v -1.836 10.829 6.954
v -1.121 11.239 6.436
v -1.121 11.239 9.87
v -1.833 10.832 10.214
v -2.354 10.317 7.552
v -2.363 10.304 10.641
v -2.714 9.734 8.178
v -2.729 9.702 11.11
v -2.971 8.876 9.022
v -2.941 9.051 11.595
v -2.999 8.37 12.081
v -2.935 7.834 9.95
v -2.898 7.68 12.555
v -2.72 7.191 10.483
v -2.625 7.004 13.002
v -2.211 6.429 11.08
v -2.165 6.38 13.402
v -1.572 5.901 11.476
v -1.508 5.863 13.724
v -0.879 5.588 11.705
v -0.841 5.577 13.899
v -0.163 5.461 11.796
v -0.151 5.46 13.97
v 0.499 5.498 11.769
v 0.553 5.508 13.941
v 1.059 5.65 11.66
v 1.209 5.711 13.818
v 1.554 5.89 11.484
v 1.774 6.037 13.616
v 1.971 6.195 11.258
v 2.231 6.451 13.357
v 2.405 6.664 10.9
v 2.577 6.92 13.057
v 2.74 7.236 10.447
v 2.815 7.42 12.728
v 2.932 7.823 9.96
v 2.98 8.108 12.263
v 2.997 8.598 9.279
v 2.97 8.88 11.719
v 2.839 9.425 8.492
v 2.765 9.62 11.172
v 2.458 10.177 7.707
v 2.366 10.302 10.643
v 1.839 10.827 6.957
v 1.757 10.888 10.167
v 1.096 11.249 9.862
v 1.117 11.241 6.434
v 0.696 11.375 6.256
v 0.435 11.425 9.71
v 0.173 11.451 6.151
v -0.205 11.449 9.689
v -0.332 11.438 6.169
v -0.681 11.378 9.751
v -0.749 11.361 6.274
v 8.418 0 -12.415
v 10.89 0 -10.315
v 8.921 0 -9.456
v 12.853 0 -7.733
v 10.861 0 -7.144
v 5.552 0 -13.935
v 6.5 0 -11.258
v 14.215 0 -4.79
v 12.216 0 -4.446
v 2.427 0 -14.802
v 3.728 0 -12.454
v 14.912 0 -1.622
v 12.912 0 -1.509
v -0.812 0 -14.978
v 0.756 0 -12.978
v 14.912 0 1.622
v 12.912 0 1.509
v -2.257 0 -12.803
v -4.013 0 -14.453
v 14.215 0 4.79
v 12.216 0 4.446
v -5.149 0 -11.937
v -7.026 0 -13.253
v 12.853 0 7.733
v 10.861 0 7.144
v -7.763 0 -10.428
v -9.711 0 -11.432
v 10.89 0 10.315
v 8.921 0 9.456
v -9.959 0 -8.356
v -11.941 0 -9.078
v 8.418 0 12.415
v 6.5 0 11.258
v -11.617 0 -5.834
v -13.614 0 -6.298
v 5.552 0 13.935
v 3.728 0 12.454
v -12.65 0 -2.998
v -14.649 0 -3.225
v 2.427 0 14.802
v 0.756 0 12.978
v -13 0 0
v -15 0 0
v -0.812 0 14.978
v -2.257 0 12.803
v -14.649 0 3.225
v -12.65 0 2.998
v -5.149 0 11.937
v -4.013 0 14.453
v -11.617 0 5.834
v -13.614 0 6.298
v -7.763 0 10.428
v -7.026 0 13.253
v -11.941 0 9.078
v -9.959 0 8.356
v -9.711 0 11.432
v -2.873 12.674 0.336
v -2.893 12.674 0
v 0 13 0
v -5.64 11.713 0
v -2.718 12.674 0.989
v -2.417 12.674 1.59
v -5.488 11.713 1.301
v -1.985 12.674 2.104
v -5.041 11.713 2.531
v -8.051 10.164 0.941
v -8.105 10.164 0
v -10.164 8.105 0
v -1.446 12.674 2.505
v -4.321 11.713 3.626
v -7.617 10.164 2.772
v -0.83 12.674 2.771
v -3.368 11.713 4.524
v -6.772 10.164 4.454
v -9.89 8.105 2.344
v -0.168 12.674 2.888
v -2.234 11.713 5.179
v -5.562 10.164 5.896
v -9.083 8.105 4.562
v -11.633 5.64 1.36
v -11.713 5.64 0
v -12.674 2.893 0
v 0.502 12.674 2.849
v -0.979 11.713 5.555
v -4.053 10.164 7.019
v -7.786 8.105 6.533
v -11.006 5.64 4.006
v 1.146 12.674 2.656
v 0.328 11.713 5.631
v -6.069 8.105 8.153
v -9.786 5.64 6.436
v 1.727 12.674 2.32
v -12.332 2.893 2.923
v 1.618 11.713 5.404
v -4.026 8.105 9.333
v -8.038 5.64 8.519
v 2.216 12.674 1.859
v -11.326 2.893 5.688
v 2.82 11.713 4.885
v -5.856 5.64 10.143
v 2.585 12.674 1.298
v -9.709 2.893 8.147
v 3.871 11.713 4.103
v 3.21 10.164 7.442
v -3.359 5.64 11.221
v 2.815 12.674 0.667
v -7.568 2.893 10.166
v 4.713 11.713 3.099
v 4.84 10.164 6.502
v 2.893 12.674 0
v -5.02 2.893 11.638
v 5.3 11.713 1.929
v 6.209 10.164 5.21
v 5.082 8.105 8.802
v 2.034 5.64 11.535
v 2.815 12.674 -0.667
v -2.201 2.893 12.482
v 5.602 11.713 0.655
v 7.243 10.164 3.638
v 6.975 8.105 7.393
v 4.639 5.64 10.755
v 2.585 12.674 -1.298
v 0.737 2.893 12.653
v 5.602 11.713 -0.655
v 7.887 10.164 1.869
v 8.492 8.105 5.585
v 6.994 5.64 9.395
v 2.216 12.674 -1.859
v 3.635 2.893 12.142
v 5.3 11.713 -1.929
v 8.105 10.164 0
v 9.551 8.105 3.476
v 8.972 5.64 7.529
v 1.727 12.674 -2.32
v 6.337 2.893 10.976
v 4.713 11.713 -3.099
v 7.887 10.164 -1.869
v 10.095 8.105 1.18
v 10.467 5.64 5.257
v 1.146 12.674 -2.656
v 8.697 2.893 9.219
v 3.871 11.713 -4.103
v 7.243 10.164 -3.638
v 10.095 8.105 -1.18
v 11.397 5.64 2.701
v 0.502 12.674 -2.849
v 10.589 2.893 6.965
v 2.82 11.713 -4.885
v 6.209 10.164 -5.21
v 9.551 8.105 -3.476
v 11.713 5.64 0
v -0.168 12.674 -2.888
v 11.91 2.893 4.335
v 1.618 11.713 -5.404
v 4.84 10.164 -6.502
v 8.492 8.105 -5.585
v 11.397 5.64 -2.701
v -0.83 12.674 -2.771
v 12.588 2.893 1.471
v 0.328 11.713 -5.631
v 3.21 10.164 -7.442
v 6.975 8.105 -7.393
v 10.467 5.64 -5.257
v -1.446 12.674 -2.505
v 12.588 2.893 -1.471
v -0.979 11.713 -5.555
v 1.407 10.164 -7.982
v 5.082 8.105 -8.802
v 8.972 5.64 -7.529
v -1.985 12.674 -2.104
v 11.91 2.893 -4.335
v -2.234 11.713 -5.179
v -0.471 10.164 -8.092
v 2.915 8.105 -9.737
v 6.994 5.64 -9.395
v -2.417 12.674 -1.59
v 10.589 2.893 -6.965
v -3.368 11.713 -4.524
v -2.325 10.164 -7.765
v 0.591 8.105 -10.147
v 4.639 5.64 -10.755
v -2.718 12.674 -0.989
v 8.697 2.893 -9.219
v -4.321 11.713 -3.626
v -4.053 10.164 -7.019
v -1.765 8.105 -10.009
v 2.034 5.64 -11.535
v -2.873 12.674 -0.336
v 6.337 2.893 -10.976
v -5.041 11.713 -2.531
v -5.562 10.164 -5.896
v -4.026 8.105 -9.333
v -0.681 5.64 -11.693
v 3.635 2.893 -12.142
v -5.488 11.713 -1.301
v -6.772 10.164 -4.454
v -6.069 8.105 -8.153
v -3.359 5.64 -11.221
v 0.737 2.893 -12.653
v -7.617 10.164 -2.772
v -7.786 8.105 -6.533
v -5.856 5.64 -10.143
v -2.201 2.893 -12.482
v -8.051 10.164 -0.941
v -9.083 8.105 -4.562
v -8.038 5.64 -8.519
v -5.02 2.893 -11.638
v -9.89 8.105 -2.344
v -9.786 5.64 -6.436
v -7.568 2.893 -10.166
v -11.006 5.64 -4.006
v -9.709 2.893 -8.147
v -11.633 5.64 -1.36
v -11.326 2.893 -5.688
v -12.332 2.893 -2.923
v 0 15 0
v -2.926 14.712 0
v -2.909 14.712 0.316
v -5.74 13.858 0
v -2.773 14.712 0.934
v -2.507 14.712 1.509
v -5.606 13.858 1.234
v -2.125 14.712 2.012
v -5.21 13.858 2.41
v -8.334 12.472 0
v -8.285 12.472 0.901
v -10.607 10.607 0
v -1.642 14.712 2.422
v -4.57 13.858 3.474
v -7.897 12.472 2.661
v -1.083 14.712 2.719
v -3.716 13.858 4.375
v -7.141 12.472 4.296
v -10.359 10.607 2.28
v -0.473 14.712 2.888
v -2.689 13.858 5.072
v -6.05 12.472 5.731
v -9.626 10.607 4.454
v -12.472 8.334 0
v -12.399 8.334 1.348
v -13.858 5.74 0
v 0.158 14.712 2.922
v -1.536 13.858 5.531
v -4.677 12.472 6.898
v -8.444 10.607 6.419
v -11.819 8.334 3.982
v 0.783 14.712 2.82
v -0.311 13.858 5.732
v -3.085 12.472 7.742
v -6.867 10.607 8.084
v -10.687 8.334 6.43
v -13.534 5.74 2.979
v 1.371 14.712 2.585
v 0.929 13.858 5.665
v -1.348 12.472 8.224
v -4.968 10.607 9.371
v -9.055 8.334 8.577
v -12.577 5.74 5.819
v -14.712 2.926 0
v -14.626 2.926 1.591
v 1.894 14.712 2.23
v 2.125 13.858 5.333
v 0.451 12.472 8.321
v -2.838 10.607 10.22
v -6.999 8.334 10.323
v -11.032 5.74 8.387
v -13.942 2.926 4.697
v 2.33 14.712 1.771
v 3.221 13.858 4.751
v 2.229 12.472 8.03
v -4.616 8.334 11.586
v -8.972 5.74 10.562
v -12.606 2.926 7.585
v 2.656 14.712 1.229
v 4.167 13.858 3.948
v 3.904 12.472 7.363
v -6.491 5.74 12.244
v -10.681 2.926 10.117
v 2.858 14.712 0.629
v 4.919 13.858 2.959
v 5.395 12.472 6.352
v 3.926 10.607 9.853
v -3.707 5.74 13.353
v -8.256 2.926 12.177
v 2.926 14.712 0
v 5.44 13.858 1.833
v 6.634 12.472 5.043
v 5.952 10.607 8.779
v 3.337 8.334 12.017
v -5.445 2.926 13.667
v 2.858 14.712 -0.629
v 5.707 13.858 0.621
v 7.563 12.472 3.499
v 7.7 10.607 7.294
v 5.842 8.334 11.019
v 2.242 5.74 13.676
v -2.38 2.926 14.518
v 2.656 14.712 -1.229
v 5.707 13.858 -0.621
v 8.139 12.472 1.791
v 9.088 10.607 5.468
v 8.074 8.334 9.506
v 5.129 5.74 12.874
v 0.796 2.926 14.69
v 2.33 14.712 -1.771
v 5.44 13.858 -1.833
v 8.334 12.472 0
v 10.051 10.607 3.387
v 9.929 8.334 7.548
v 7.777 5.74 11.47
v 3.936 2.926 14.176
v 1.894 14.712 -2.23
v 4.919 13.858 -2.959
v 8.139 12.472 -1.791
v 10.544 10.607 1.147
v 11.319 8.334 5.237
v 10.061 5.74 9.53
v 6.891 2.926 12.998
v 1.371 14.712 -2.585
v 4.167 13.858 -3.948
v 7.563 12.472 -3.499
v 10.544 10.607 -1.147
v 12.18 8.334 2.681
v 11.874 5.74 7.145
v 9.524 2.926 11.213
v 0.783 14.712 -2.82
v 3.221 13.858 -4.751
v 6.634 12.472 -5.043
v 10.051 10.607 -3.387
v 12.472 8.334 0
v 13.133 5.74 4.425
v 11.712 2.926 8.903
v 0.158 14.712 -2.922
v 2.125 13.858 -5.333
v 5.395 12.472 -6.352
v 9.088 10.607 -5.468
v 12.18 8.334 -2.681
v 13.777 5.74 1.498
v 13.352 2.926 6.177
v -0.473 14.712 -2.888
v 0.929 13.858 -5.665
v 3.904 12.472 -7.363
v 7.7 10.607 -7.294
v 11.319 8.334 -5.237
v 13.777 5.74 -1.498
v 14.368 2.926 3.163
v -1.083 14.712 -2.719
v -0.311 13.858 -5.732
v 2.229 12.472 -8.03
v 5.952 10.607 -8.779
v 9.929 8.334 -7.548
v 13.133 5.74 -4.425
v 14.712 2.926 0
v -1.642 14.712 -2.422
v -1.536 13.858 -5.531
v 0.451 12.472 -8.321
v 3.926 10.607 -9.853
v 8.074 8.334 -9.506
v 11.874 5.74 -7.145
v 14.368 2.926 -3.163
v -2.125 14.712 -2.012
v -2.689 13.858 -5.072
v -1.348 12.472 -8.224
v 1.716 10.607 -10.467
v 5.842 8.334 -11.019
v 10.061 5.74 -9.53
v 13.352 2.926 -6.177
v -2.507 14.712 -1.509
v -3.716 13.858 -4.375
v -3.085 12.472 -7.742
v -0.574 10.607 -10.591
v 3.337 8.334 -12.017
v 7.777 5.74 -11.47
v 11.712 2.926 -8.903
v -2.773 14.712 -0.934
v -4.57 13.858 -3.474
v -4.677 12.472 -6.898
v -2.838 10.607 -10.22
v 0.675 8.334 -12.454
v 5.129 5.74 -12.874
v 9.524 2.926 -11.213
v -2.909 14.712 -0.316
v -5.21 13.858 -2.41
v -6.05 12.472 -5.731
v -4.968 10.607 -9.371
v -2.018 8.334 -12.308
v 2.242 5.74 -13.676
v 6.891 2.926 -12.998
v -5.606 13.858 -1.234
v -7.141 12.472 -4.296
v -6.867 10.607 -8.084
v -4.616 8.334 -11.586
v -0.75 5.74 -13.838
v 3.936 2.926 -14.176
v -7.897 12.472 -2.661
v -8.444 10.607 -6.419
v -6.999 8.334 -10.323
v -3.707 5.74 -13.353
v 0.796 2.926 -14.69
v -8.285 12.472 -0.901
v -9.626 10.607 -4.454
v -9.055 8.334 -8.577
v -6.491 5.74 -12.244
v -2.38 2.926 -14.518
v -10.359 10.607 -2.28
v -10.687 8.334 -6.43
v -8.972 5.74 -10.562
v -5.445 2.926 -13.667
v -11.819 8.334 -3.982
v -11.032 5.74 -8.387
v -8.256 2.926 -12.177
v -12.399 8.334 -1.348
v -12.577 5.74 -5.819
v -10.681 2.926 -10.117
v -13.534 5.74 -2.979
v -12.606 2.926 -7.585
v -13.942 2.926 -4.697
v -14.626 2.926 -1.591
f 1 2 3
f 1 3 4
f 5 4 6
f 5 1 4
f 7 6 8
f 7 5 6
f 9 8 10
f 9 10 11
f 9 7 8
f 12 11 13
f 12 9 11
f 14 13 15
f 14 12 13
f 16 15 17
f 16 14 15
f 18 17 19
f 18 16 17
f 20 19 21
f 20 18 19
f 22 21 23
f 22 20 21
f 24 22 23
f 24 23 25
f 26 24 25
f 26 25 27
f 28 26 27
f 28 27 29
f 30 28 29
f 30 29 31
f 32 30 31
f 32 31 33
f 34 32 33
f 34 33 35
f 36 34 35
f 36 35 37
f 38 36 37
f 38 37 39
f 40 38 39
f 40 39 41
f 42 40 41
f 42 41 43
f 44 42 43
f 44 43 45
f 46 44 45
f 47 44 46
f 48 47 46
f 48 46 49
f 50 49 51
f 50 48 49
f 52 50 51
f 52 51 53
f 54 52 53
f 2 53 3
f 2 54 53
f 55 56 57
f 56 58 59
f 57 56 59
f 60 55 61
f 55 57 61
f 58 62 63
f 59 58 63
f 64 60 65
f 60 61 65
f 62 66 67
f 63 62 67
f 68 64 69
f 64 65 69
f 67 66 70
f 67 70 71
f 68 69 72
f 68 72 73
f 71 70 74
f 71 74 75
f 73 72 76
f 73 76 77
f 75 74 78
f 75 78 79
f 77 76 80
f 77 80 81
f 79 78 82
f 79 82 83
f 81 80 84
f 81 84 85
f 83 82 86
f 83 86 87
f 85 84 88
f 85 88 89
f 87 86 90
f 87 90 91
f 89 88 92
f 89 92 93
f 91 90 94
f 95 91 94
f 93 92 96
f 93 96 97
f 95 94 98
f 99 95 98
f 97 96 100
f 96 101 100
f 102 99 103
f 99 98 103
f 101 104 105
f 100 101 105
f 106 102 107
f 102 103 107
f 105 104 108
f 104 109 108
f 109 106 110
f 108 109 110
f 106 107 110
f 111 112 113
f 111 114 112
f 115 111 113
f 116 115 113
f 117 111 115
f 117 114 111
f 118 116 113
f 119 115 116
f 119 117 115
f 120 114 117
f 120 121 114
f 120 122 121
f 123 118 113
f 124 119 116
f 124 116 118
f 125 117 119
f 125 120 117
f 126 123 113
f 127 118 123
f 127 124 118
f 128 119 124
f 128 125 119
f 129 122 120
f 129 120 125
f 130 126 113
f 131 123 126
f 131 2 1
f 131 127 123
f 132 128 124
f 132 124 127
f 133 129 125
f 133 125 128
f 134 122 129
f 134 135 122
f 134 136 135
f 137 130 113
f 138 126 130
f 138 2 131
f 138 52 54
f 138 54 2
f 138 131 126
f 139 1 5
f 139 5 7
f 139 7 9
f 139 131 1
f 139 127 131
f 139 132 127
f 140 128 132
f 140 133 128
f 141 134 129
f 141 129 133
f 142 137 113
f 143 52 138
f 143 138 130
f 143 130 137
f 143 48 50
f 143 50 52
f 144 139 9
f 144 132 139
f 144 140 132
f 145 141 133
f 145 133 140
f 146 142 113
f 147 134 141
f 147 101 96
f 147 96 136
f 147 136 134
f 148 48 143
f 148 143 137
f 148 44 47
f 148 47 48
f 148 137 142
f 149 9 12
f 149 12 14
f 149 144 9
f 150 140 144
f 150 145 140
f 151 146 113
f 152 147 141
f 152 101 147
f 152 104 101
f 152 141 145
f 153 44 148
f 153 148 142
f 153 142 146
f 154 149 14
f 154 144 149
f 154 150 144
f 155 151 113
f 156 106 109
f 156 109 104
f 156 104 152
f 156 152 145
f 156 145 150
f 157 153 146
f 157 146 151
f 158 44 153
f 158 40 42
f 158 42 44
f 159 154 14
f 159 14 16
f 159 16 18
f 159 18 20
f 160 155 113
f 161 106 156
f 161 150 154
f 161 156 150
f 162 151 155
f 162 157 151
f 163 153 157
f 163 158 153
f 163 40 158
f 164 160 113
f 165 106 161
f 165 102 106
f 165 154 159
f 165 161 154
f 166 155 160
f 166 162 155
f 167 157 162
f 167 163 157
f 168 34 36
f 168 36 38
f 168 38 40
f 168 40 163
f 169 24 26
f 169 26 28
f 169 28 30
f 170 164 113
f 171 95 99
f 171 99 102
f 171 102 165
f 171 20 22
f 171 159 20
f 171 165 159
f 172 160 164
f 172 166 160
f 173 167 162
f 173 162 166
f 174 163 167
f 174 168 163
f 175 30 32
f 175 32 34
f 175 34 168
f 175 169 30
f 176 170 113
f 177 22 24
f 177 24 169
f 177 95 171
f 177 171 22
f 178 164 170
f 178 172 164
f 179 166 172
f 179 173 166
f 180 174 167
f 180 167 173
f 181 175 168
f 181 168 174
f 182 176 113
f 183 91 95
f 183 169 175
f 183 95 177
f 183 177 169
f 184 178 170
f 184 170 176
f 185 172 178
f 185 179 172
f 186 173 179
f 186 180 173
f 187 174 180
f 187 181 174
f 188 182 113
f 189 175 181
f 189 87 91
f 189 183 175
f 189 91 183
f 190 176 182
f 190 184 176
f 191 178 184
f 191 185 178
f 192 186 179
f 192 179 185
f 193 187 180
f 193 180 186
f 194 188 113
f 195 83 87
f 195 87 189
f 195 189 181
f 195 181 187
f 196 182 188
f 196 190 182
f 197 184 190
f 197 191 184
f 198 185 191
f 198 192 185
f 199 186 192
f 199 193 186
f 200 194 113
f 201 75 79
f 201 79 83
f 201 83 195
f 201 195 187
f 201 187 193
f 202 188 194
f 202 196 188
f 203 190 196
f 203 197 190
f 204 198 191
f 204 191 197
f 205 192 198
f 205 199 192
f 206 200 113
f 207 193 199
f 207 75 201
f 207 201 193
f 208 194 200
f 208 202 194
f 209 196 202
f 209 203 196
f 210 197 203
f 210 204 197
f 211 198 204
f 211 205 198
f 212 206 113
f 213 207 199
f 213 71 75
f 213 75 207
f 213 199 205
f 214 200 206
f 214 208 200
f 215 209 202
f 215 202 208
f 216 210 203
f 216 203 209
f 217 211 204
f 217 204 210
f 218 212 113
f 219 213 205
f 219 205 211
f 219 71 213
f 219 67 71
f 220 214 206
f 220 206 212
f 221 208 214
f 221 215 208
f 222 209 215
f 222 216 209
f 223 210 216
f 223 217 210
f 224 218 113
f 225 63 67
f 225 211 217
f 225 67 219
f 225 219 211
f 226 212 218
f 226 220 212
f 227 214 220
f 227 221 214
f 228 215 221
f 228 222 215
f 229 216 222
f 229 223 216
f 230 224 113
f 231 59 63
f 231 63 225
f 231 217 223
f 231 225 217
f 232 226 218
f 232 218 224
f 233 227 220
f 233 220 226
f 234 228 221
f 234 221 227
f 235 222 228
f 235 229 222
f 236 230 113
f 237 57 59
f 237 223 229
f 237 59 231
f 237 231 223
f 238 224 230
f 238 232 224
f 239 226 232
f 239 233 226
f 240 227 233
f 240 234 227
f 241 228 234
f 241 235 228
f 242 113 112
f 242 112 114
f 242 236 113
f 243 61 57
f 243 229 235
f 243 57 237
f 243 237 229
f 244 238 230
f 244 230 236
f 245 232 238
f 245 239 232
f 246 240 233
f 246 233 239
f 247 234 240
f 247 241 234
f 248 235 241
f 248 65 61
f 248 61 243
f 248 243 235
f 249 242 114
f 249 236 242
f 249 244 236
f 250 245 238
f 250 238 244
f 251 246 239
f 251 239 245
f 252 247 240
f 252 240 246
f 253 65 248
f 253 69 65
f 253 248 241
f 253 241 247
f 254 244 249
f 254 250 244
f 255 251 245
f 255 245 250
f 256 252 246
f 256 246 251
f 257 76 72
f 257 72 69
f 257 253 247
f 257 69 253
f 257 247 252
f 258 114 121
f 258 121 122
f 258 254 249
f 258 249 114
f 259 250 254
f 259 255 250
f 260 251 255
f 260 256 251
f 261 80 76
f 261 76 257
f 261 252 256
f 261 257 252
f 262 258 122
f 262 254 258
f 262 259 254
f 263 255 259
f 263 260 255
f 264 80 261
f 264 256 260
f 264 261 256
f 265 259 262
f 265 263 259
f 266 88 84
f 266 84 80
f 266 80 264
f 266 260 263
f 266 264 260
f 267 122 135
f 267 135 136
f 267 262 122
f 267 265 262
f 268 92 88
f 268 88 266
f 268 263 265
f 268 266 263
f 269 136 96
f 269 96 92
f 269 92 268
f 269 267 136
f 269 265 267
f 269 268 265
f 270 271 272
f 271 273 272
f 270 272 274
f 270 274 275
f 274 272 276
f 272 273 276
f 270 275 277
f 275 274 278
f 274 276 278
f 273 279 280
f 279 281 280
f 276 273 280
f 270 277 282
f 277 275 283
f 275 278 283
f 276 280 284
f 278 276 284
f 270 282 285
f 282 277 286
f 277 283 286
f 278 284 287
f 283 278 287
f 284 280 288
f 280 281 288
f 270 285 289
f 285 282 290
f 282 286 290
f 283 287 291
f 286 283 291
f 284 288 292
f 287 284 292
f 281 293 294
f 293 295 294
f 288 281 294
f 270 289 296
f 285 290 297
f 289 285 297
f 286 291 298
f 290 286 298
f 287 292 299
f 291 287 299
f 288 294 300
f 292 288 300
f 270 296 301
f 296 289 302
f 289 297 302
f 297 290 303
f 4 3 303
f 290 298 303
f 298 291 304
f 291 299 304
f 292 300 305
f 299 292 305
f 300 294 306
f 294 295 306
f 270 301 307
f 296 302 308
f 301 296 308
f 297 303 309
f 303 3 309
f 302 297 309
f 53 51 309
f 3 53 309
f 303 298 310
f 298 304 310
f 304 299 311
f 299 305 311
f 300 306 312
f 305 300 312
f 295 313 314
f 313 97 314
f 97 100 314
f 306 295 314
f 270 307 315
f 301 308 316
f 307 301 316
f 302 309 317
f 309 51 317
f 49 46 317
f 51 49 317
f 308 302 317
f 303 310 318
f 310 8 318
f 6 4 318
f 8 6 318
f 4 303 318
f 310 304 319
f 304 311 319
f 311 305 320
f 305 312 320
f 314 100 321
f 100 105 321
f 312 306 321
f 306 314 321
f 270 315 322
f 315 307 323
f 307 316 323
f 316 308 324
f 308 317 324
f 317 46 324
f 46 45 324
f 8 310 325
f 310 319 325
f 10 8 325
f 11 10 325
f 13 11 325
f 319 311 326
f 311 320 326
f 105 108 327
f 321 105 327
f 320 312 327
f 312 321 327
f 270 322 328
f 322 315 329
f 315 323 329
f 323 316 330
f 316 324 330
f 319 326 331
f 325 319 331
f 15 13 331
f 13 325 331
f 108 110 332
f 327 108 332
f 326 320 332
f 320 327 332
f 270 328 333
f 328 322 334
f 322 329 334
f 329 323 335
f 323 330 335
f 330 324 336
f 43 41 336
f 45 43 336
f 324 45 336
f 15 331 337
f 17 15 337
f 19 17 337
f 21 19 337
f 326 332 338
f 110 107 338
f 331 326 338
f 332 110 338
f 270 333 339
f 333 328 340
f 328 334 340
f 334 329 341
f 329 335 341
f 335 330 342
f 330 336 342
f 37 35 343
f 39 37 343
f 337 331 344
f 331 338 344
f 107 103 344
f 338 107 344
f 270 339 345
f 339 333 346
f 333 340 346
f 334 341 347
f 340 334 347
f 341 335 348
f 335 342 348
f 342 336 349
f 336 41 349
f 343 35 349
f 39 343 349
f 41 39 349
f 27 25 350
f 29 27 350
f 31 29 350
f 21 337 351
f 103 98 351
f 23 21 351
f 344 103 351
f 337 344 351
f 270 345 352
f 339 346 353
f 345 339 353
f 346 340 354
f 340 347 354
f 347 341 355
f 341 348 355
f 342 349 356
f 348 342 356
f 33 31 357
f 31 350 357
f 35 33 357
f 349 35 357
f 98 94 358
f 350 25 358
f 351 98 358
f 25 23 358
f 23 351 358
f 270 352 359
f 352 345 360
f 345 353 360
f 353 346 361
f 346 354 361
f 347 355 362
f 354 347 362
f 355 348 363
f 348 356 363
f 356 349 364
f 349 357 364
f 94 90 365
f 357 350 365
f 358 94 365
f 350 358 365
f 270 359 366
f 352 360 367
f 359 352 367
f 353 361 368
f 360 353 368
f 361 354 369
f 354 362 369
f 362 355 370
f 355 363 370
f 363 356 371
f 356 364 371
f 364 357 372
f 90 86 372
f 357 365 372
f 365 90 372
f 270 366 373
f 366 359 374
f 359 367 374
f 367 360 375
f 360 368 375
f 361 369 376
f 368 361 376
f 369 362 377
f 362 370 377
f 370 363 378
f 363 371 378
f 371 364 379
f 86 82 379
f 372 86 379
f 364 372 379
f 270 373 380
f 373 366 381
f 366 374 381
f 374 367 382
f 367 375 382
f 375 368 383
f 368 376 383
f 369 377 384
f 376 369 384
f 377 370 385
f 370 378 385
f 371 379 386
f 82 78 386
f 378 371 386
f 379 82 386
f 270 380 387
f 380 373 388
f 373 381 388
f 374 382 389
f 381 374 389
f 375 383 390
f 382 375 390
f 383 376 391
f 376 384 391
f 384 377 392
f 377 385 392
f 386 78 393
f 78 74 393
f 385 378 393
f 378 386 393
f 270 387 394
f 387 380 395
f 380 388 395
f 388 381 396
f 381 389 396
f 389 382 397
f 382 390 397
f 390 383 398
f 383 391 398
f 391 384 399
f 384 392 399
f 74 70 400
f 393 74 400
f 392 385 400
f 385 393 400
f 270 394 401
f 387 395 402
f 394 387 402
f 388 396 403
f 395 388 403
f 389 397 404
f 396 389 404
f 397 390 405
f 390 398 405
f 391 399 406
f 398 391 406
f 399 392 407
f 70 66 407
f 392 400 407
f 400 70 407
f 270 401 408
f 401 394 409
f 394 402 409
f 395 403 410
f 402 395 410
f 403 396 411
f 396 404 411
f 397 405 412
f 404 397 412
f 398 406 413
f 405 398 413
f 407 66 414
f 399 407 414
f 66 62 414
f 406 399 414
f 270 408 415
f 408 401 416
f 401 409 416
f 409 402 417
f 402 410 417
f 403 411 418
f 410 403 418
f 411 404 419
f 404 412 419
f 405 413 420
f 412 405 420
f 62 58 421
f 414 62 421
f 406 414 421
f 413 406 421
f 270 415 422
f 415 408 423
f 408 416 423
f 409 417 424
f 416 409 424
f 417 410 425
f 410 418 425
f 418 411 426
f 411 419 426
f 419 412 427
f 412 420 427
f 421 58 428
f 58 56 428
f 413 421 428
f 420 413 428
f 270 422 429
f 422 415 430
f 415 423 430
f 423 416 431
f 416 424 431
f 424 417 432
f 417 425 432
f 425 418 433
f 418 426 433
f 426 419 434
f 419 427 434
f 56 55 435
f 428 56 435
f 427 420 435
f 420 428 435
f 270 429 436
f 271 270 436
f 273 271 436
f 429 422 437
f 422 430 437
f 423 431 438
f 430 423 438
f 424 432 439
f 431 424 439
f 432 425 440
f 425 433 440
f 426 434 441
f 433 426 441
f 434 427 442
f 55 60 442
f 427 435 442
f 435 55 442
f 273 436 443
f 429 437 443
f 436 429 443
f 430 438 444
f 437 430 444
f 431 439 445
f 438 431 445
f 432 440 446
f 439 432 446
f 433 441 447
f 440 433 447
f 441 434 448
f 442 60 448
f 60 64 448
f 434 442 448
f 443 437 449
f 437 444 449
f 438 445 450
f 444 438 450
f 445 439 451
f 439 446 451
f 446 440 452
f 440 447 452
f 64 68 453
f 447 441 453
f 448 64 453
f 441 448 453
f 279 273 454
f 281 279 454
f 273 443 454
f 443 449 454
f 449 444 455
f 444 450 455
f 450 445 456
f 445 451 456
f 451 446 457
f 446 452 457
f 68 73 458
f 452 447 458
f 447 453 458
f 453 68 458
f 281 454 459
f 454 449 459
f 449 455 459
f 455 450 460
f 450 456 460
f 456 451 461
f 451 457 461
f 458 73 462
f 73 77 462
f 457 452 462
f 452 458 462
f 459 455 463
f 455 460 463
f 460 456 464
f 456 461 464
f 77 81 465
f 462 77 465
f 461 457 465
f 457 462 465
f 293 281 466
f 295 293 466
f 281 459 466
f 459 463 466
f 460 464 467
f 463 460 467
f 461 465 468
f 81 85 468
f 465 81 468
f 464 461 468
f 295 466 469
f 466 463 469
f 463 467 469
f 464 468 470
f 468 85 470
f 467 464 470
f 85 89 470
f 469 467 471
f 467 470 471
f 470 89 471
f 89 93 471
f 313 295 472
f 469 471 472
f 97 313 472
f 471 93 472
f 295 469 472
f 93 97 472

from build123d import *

# Parameters (mm, degrees)
VACIADO2_T            = -2
CROQUIS2_R            = 3
CORTAR_EXTRUIR1_DEPTH = 26.980762114


with BuildPart() as part:
    # Croquis1 → Revolución1 (revolve)
    with BuildSketch(Plane.XY):
        with BuildLine():
            Line((0, 0), (0, 15))
            ThreePointArc((0, 15), (-10.606601718, 10.606601718), (-15, 0))
            Line((-15, 0), (0, 0))
        make_face()
    revolve(axis=Axis((0, 0, 0), (0, 1, 0)))

    # Vaciado2
    vaciado2_openings = [part.faces().sort_by_distance(p)[0] for p in [
        (0, 0, 0),
    ]]
    offset(amount=VACIADO2_T, openings=vaciado2_openings, kind=Kind.INTERSECTION)

    # Croquis2 → Cortar-Extruir1 (cut, through all)
    with BuildSketch(Plane.XY):
        with Locations(Location((0, 8.456456299, 0), (0, 0, 111.940512479))):
            Circle(CROQUIS2_R)
    extrude(amount=CORTAR_EXTRUIR1_DEPTH, mode=Mode.SUBTRACT)


solid = part.part
